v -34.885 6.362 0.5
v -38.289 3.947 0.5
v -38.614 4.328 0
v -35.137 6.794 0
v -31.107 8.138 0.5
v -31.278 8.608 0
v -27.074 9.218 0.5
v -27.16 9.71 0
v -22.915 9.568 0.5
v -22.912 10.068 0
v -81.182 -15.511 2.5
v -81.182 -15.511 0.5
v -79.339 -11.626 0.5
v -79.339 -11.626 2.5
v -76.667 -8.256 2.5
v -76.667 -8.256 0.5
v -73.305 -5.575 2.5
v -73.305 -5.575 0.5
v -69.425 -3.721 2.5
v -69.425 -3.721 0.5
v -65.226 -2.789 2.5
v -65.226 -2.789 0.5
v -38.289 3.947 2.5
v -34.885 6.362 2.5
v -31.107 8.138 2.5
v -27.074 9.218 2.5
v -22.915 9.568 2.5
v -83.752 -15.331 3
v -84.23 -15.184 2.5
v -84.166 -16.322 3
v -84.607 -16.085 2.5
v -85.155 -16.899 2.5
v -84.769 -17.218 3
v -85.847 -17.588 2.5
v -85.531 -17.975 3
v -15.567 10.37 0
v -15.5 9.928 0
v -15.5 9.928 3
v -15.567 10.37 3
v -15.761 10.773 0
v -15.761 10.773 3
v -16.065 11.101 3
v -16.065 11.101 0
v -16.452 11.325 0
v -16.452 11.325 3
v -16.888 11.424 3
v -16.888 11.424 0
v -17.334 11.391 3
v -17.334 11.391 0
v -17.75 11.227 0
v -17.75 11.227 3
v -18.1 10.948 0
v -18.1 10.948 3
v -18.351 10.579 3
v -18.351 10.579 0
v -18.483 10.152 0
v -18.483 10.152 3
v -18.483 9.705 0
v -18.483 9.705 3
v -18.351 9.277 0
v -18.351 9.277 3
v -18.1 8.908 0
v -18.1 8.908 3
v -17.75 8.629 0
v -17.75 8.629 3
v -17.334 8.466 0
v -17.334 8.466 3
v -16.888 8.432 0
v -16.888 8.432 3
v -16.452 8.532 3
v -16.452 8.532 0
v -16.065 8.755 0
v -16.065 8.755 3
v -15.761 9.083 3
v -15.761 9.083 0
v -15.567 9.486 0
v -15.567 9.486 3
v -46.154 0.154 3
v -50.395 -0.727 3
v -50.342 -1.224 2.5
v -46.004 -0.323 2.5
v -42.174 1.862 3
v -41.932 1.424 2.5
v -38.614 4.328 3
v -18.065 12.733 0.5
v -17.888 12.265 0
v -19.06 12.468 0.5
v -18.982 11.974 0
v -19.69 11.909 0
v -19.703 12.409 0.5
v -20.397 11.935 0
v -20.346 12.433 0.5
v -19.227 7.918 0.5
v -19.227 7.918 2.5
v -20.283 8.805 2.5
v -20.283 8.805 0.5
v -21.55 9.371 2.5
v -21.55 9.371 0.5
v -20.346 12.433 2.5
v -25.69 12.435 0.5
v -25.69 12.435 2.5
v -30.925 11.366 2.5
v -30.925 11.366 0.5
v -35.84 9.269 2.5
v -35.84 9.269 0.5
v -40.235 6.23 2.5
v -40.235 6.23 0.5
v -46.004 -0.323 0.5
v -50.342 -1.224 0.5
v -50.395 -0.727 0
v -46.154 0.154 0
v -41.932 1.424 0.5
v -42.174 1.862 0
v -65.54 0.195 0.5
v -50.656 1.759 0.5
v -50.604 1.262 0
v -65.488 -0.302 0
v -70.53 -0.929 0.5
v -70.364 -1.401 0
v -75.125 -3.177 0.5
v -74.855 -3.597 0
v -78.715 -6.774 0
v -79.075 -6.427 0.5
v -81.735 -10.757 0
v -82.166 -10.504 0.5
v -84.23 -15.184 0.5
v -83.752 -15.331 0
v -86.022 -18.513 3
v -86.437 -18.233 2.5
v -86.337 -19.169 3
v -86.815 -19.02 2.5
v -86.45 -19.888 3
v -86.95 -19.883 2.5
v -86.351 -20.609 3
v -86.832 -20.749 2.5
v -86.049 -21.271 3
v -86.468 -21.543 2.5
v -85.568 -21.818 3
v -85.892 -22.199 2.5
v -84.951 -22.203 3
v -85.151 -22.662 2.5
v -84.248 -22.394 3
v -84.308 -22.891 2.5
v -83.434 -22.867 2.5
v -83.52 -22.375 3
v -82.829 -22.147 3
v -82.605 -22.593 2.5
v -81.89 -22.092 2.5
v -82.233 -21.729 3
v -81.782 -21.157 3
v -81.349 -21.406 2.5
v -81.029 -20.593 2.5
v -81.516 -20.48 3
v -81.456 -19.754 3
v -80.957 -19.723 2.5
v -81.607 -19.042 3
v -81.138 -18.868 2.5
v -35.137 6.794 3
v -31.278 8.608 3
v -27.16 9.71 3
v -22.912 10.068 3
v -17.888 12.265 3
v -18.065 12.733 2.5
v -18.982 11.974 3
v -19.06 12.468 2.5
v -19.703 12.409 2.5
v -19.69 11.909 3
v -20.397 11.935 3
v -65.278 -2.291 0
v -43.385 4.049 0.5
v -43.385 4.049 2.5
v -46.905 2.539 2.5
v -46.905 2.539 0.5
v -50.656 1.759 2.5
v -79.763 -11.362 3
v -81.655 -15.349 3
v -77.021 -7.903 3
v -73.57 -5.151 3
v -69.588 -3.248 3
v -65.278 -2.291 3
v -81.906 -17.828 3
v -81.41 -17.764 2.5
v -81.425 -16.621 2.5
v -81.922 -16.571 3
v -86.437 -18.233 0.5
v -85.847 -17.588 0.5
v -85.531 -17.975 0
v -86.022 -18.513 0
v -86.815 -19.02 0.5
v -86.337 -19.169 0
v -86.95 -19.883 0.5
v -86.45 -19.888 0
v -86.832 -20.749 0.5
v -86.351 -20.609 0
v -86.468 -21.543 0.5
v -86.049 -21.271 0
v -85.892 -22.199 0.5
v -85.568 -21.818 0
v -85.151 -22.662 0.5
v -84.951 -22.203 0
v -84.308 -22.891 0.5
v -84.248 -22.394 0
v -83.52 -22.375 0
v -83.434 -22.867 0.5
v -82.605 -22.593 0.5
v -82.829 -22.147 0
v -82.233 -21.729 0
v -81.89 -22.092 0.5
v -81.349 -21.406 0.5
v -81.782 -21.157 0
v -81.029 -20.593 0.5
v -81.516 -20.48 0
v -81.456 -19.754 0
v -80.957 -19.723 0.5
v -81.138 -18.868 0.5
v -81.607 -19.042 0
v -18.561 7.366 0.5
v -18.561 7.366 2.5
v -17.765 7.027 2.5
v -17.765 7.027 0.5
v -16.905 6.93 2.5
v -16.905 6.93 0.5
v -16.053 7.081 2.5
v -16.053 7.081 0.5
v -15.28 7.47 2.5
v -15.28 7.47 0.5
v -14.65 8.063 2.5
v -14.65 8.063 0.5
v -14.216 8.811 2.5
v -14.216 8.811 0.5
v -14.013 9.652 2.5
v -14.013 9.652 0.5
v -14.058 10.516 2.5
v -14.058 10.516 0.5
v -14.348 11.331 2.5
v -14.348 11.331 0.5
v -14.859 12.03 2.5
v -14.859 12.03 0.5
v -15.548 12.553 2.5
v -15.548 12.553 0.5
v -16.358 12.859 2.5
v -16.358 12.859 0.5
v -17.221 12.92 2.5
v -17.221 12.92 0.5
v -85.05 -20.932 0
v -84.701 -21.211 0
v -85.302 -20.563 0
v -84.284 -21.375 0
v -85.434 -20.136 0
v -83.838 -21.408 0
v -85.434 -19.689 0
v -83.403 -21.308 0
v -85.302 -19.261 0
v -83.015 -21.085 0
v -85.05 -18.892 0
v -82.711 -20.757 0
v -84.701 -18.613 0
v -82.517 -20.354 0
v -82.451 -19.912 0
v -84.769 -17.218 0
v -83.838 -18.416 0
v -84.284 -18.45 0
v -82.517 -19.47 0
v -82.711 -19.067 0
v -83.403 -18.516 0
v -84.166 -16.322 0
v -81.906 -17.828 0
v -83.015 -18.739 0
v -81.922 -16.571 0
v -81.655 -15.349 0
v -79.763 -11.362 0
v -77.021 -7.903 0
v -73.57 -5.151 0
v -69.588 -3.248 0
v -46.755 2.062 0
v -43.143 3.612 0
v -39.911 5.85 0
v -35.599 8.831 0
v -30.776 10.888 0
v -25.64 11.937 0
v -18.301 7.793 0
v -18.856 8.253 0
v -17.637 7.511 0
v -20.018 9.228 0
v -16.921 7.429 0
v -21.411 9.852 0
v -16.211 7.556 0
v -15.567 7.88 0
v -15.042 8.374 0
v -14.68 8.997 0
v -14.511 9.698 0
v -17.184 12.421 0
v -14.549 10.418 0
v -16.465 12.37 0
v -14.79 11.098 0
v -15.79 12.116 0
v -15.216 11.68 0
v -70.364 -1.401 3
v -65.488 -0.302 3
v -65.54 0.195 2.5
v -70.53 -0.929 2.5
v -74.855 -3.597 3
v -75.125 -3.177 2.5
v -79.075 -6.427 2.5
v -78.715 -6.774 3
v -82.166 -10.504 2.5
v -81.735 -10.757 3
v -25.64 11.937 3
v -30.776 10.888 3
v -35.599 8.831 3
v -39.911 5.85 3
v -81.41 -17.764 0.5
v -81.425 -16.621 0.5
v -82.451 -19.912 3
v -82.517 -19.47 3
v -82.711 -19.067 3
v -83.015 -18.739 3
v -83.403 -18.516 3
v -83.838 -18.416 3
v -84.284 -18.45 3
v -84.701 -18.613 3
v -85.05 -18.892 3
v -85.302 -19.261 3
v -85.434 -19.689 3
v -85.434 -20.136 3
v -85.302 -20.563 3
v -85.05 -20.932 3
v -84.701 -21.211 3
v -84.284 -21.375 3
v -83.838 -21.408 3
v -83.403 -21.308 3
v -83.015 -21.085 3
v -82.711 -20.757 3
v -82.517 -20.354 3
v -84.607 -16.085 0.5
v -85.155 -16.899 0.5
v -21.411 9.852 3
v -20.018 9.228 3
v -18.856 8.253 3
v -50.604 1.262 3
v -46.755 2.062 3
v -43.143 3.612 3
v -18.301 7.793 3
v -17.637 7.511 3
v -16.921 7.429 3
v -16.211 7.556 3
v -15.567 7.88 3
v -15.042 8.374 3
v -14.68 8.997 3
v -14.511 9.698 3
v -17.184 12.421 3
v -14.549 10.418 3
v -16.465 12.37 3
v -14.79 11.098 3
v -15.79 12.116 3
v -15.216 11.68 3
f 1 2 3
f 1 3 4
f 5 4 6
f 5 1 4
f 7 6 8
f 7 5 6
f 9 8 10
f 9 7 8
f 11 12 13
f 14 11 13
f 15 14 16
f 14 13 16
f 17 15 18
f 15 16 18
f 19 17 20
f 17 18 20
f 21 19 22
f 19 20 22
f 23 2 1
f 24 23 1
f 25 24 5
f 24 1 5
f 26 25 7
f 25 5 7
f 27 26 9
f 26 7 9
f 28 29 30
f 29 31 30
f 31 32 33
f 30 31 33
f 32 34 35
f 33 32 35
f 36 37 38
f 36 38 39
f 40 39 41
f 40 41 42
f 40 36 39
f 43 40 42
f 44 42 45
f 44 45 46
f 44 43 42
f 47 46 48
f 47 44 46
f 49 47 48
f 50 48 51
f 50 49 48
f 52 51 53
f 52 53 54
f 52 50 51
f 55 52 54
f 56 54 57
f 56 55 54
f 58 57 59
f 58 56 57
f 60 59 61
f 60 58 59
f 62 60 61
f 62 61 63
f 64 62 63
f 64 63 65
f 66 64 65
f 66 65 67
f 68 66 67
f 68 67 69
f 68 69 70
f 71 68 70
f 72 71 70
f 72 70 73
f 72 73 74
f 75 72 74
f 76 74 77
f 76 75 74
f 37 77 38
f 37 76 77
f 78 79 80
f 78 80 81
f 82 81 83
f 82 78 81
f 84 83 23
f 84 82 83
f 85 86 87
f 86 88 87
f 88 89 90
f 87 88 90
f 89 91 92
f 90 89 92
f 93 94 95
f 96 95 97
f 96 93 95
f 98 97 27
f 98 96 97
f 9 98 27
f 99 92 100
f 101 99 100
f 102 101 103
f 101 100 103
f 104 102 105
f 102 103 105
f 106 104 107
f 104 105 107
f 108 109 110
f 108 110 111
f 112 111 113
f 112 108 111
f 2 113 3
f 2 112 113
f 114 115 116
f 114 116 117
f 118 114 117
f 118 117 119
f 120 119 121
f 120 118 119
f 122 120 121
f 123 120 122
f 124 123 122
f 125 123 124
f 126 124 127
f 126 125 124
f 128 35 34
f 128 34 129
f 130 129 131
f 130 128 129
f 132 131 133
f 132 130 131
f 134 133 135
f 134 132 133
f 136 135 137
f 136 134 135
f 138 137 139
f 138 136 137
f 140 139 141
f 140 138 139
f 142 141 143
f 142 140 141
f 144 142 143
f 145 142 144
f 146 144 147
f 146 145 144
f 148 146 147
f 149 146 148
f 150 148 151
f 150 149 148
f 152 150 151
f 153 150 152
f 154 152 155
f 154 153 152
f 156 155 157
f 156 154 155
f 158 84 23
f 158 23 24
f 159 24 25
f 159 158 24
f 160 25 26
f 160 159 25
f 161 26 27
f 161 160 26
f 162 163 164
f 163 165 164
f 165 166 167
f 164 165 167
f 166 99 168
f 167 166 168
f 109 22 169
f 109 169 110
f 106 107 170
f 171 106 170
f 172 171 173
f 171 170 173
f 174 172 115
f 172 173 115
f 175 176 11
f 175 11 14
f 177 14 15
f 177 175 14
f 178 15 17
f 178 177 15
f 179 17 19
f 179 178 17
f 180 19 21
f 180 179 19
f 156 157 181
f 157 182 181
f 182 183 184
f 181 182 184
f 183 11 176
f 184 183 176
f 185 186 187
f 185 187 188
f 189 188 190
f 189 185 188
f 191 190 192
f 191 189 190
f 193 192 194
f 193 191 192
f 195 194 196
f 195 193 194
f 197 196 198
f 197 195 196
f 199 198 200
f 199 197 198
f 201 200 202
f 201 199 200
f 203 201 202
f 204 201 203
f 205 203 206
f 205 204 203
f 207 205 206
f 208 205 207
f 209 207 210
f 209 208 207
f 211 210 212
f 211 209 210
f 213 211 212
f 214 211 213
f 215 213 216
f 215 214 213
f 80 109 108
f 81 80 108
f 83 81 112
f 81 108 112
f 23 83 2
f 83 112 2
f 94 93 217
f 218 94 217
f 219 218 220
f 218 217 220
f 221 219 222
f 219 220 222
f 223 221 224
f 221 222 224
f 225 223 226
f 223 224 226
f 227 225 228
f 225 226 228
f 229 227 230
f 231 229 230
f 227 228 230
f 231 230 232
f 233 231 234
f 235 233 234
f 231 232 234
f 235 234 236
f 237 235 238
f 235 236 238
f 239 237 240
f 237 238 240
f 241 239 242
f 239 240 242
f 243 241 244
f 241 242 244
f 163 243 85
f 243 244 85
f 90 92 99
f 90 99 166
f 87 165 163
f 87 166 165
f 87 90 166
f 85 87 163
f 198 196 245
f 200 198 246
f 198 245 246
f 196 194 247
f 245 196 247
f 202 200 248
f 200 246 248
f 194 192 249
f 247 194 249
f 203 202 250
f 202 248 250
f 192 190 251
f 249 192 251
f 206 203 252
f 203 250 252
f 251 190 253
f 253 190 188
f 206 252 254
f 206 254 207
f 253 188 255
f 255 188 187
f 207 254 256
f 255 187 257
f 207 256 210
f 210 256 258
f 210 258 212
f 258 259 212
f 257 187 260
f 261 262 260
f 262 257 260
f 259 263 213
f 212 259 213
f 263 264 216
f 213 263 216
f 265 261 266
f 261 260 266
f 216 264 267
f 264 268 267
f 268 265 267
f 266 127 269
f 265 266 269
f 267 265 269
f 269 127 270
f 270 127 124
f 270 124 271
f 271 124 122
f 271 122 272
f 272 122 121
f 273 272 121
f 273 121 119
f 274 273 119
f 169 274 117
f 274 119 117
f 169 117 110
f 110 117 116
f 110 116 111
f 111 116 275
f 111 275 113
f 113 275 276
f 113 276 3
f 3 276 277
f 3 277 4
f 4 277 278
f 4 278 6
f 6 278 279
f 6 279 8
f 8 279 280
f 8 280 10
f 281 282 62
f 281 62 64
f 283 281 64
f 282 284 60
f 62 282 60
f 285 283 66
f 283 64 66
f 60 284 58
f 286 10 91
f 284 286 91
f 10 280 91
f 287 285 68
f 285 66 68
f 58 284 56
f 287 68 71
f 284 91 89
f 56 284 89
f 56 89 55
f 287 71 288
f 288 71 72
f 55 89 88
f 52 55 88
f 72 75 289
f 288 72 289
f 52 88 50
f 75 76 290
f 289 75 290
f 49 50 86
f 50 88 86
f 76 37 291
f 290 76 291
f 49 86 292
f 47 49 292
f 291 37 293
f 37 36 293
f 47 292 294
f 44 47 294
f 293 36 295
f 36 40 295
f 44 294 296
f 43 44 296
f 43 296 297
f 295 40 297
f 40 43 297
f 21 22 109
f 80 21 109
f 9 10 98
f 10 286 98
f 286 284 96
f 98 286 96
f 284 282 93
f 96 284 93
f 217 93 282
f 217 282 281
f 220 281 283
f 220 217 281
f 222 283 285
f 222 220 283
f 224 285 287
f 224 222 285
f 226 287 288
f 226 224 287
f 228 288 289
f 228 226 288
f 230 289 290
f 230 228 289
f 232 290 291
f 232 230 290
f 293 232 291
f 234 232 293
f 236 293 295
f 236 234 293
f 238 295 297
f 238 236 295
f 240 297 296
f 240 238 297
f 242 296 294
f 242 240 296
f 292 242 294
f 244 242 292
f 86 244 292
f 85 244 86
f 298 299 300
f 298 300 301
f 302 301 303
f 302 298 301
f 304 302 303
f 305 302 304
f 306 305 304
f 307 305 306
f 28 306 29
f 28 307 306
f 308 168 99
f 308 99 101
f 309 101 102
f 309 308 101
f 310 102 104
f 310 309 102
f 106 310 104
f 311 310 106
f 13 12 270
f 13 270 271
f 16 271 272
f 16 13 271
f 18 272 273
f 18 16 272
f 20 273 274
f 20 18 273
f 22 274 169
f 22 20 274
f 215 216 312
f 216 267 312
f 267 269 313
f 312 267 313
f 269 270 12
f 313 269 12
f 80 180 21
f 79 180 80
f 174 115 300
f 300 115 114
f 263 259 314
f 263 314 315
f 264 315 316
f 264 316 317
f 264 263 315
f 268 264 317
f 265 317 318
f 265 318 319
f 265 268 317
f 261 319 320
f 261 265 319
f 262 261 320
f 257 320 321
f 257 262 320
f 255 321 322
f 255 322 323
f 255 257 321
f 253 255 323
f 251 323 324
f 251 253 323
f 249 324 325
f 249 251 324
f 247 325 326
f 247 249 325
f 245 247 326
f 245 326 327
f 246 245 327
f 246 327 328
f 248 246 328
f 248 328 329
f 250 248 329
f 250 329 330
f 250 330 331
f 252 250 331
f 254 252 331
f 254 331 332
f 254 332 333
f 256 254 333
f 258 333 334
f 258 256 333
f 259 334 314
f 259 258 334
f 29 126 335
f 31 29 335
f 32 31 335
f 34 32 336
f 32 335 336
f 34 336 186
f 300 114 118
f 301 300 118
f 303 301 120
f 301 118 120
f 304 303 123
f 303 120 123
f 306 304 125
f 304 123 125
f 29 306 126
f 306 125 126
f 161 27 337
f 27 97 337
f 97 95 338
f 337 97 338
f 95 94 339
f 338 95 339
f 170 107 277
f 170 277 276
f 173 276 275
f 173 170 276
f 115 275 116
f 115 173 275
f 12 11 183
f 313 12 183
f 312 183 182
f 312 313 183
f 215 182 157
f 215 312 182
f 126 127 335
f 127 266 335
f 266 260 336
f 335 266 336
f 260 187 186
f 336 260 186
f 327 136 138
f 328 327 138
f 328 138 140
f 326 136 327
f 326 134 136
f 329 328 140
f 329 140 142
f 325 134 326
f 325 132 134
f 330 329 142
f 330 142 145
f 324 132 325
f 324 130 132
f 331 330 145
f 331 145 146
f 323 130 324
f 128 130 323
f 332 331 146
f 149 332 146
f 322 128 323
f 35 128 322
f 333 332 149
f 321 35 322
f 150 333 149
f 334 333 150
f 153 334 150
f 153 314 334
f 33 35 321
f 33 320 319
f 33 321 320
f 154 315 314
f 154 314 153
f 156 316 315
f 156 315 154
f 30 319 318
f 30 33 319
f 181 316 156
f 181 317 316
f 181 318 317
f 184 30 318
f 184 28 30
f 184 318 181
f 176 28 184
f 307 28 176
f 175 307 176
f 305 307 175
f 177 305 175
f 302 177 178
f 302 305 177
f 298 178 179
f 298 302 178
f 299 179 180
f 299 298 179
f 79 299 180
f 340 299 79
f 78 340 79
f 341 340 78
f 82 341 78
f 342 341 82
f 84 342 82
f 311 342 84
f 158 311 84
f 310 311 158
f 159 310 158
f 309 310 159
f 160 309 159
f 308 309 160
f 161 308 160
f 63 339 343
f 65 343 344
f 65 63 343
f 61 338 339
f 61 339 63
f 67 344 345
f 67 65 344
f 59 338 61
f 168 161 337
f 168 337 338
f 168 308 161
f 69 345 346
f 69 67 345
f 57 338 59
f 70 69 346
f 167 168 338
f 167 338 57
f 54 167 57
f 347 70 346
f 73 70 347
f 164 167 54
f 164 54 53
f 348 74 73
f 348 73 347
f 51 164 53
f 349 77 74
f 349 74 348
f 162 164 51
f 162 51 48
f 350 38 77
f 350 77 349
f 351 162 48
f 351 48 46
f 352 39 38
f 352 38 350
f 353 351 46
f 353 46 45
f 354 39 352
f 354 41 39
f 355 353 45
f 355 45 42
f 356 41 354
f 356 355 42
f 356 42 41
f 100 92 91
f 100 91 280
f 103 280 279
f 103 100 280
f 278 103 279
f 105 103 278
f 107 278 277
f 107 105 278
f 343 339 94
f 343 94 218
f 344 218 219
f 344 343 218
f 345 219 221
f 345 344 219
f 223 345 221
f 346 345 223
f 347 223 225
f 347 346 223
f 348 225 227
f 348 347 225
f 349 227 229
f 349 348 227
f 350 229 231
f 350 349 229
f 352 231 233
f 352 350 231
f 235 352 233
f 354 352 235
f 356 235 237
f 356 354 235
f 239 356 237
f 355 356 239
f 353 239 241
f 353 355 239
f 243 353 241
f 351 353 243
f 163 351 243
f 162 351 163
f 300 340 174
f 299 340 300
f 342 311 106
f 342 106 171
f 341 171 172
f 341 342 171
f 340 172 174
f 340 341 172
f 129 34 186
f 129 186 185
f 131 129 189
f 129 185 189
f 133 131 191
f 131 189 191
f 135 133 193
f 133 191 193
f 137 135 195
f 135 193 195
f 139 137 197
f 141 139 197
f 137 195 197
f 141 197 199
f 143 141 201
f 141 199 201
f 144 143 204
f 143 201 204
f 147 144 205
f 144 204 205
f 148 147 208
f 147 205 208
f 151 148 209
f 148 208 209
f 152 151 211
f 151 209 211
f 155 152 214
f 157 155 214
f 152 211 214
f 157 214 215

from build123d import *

# Parameters (mm, degrees)
SKETCH1_R             = 3
SKETCH1_R_2           = 1.5
BOSS_EXTRUDE1_DEPTH   = 3
BOSS_EXTRUDE1_2_DEPTH = 3
EXTRUDE_THIN1_DEPTH   = 3
FILLET1_R             = 5
CHAMFER1_SIZE         = 0.5


with BuildPart() as part:
    # Sketch1 → Boss-Extrude1 (new body)
    with BuildSketch(Plane.XY):
        with Locations((-83.950540957, -19.912145865)):
            Circle(SKETCH1_R)
        with Locations((-83.950540957, -19.912145865)):
            Circle(SKETCH1_R_2, mode=Mode.SUBTRACT)
    extrude(amount=BOSS_EXTRUDE1_DEPTH)



with BuildPart() as body_2:
    # Sketch1 → Boss-Extrude1 2 (new body)
    with BuildSketch(Plane.XY):
        with Locations((-17, 9.92820323)):
            Circle(SKETCH1_R)
        with Locations((-17, 9.92820323)):
            Circle(SKETCH1_R_2, mode=Mode.SUBTRACT)
    extrude(amount=BOSS_EXTRUDE1_2_DEPTH)


with BuildPart() as part_1:
    add(part.part)

    add(body_2.part)  # Extrude-Thin1 merges body 2
    # Sketch2 → Extrude-Thin1 (add)
    with BuildSketch(Plane.XY):
        with BuildLine():
            ThreePointArc((-81.866086482, -18.096227729), (-76.0782564, -7.689979577), (-65.226210809, -2.788746653))
            Line((-65.226210809, -2.788746653), (-50.342422521, -1.224397467))
            ThreePointArc((-50.342422521, -1.224397467), (-43.92427654, 0.448702034), (-38.289233854, 3.947009295))
            ThreePointArc((-38.289233854, 3.947009295), (-29.303097517, 8.716235486), (-19.143567587, 9.245495681))
            Line((-19.143567587, 9.245495681), (-18.648168411, 12.204309575))
            ThreePointArc((-18.648168411, 12.204309575), (-30.10325921, 11.607557202), (-40.235323233, 6.230151019))
            ThreePointArc((-40.235323233, 6.230151019), (-45.107146333, 3.205660332), (-50.65600791, 1.759168219))
            Line((-50.65600791, 1.759168219), (-65.539796199, 0.194819033))
            ThreePointArc((-65.539796199, 0.194819033), (-78.10933943, -5.482106907), (-84.813179718, -17.535298624))
            Line((-84.813179718, -17.535298624), (-81.866086482, -18.096227729))
        make_face()
    extrude(amount=EXTRUDE_THIN1_DEPTH)

    # Fillet1
    fillet1_edges = [part_1.edges().sort_by_distance(p)[0] for p in [
        (-84.706300556, -17.008901571, 1.5),
        (-81.809477217, -17.810754407, 1.5),
        (-18.904716374, 12.245972748, 1.5),
        (-19.94680617, 9.365767994, 1.5),
    ]]
    fillet(fillet1_edges, radius=FILLET1_R)

    # Chamfer1
    chamfer1_edges = [part_1.edges().sort_by_distance(p)[0] for p in [
        (-77.195374918, -4.686748809, 0),
        (-75.062303692, -6.819526639, 3),
        (-57.784316665, -2.00657206, 3),
        (-43.92427654, 0.448702034, 3),
        (-45.107146333, 3.205660332, 0),
        (-58.097902055, 0.976993626, 0),
        (-45.107146333, 3.205660332, 3),
        (-58.097902055, 0.976993626, 3),
        (-77.195374918, -4.686748809, 3),
        (-75.062303692, -6.819526639, 0),
        (-43.92427654, 0.448702034, 0),
        (-57.784316665, -2.00657206, 0),
        (-84.737508384, -22.807086671, 0),
        (-84.737508384, -22.807086671, 3),
        (-31.106705209, 8.137983689, 0),
        (-31.106705209, 8.137983689, 3),
        (-14.083717416, 9.224430618, 0),
        (-14.083717416, 9.224430618, 3),
        (-30.92519874, 11.365731626, 0),
        (-30.92519874, 11.365731626, 3),
        (-84.860623121, -16.505866782, 3),
        (-84.860623121, -16.505866782, 0),
        (-81.450241332, -17.19340927, 3),
        (-81.450241332, -17.19340927, 0),
        (-20.896879636, 9.132244106, 3),
        (-20.896879636, 9.132244106, 0),
        (-19.18823543, 12.449634759, 3),
        (-19.18823543, 12.449634759, 0),
    ]]
    chamfer(chamfer1_edges, length=CHAMFER1_SIZE)


solid = part_1.part
